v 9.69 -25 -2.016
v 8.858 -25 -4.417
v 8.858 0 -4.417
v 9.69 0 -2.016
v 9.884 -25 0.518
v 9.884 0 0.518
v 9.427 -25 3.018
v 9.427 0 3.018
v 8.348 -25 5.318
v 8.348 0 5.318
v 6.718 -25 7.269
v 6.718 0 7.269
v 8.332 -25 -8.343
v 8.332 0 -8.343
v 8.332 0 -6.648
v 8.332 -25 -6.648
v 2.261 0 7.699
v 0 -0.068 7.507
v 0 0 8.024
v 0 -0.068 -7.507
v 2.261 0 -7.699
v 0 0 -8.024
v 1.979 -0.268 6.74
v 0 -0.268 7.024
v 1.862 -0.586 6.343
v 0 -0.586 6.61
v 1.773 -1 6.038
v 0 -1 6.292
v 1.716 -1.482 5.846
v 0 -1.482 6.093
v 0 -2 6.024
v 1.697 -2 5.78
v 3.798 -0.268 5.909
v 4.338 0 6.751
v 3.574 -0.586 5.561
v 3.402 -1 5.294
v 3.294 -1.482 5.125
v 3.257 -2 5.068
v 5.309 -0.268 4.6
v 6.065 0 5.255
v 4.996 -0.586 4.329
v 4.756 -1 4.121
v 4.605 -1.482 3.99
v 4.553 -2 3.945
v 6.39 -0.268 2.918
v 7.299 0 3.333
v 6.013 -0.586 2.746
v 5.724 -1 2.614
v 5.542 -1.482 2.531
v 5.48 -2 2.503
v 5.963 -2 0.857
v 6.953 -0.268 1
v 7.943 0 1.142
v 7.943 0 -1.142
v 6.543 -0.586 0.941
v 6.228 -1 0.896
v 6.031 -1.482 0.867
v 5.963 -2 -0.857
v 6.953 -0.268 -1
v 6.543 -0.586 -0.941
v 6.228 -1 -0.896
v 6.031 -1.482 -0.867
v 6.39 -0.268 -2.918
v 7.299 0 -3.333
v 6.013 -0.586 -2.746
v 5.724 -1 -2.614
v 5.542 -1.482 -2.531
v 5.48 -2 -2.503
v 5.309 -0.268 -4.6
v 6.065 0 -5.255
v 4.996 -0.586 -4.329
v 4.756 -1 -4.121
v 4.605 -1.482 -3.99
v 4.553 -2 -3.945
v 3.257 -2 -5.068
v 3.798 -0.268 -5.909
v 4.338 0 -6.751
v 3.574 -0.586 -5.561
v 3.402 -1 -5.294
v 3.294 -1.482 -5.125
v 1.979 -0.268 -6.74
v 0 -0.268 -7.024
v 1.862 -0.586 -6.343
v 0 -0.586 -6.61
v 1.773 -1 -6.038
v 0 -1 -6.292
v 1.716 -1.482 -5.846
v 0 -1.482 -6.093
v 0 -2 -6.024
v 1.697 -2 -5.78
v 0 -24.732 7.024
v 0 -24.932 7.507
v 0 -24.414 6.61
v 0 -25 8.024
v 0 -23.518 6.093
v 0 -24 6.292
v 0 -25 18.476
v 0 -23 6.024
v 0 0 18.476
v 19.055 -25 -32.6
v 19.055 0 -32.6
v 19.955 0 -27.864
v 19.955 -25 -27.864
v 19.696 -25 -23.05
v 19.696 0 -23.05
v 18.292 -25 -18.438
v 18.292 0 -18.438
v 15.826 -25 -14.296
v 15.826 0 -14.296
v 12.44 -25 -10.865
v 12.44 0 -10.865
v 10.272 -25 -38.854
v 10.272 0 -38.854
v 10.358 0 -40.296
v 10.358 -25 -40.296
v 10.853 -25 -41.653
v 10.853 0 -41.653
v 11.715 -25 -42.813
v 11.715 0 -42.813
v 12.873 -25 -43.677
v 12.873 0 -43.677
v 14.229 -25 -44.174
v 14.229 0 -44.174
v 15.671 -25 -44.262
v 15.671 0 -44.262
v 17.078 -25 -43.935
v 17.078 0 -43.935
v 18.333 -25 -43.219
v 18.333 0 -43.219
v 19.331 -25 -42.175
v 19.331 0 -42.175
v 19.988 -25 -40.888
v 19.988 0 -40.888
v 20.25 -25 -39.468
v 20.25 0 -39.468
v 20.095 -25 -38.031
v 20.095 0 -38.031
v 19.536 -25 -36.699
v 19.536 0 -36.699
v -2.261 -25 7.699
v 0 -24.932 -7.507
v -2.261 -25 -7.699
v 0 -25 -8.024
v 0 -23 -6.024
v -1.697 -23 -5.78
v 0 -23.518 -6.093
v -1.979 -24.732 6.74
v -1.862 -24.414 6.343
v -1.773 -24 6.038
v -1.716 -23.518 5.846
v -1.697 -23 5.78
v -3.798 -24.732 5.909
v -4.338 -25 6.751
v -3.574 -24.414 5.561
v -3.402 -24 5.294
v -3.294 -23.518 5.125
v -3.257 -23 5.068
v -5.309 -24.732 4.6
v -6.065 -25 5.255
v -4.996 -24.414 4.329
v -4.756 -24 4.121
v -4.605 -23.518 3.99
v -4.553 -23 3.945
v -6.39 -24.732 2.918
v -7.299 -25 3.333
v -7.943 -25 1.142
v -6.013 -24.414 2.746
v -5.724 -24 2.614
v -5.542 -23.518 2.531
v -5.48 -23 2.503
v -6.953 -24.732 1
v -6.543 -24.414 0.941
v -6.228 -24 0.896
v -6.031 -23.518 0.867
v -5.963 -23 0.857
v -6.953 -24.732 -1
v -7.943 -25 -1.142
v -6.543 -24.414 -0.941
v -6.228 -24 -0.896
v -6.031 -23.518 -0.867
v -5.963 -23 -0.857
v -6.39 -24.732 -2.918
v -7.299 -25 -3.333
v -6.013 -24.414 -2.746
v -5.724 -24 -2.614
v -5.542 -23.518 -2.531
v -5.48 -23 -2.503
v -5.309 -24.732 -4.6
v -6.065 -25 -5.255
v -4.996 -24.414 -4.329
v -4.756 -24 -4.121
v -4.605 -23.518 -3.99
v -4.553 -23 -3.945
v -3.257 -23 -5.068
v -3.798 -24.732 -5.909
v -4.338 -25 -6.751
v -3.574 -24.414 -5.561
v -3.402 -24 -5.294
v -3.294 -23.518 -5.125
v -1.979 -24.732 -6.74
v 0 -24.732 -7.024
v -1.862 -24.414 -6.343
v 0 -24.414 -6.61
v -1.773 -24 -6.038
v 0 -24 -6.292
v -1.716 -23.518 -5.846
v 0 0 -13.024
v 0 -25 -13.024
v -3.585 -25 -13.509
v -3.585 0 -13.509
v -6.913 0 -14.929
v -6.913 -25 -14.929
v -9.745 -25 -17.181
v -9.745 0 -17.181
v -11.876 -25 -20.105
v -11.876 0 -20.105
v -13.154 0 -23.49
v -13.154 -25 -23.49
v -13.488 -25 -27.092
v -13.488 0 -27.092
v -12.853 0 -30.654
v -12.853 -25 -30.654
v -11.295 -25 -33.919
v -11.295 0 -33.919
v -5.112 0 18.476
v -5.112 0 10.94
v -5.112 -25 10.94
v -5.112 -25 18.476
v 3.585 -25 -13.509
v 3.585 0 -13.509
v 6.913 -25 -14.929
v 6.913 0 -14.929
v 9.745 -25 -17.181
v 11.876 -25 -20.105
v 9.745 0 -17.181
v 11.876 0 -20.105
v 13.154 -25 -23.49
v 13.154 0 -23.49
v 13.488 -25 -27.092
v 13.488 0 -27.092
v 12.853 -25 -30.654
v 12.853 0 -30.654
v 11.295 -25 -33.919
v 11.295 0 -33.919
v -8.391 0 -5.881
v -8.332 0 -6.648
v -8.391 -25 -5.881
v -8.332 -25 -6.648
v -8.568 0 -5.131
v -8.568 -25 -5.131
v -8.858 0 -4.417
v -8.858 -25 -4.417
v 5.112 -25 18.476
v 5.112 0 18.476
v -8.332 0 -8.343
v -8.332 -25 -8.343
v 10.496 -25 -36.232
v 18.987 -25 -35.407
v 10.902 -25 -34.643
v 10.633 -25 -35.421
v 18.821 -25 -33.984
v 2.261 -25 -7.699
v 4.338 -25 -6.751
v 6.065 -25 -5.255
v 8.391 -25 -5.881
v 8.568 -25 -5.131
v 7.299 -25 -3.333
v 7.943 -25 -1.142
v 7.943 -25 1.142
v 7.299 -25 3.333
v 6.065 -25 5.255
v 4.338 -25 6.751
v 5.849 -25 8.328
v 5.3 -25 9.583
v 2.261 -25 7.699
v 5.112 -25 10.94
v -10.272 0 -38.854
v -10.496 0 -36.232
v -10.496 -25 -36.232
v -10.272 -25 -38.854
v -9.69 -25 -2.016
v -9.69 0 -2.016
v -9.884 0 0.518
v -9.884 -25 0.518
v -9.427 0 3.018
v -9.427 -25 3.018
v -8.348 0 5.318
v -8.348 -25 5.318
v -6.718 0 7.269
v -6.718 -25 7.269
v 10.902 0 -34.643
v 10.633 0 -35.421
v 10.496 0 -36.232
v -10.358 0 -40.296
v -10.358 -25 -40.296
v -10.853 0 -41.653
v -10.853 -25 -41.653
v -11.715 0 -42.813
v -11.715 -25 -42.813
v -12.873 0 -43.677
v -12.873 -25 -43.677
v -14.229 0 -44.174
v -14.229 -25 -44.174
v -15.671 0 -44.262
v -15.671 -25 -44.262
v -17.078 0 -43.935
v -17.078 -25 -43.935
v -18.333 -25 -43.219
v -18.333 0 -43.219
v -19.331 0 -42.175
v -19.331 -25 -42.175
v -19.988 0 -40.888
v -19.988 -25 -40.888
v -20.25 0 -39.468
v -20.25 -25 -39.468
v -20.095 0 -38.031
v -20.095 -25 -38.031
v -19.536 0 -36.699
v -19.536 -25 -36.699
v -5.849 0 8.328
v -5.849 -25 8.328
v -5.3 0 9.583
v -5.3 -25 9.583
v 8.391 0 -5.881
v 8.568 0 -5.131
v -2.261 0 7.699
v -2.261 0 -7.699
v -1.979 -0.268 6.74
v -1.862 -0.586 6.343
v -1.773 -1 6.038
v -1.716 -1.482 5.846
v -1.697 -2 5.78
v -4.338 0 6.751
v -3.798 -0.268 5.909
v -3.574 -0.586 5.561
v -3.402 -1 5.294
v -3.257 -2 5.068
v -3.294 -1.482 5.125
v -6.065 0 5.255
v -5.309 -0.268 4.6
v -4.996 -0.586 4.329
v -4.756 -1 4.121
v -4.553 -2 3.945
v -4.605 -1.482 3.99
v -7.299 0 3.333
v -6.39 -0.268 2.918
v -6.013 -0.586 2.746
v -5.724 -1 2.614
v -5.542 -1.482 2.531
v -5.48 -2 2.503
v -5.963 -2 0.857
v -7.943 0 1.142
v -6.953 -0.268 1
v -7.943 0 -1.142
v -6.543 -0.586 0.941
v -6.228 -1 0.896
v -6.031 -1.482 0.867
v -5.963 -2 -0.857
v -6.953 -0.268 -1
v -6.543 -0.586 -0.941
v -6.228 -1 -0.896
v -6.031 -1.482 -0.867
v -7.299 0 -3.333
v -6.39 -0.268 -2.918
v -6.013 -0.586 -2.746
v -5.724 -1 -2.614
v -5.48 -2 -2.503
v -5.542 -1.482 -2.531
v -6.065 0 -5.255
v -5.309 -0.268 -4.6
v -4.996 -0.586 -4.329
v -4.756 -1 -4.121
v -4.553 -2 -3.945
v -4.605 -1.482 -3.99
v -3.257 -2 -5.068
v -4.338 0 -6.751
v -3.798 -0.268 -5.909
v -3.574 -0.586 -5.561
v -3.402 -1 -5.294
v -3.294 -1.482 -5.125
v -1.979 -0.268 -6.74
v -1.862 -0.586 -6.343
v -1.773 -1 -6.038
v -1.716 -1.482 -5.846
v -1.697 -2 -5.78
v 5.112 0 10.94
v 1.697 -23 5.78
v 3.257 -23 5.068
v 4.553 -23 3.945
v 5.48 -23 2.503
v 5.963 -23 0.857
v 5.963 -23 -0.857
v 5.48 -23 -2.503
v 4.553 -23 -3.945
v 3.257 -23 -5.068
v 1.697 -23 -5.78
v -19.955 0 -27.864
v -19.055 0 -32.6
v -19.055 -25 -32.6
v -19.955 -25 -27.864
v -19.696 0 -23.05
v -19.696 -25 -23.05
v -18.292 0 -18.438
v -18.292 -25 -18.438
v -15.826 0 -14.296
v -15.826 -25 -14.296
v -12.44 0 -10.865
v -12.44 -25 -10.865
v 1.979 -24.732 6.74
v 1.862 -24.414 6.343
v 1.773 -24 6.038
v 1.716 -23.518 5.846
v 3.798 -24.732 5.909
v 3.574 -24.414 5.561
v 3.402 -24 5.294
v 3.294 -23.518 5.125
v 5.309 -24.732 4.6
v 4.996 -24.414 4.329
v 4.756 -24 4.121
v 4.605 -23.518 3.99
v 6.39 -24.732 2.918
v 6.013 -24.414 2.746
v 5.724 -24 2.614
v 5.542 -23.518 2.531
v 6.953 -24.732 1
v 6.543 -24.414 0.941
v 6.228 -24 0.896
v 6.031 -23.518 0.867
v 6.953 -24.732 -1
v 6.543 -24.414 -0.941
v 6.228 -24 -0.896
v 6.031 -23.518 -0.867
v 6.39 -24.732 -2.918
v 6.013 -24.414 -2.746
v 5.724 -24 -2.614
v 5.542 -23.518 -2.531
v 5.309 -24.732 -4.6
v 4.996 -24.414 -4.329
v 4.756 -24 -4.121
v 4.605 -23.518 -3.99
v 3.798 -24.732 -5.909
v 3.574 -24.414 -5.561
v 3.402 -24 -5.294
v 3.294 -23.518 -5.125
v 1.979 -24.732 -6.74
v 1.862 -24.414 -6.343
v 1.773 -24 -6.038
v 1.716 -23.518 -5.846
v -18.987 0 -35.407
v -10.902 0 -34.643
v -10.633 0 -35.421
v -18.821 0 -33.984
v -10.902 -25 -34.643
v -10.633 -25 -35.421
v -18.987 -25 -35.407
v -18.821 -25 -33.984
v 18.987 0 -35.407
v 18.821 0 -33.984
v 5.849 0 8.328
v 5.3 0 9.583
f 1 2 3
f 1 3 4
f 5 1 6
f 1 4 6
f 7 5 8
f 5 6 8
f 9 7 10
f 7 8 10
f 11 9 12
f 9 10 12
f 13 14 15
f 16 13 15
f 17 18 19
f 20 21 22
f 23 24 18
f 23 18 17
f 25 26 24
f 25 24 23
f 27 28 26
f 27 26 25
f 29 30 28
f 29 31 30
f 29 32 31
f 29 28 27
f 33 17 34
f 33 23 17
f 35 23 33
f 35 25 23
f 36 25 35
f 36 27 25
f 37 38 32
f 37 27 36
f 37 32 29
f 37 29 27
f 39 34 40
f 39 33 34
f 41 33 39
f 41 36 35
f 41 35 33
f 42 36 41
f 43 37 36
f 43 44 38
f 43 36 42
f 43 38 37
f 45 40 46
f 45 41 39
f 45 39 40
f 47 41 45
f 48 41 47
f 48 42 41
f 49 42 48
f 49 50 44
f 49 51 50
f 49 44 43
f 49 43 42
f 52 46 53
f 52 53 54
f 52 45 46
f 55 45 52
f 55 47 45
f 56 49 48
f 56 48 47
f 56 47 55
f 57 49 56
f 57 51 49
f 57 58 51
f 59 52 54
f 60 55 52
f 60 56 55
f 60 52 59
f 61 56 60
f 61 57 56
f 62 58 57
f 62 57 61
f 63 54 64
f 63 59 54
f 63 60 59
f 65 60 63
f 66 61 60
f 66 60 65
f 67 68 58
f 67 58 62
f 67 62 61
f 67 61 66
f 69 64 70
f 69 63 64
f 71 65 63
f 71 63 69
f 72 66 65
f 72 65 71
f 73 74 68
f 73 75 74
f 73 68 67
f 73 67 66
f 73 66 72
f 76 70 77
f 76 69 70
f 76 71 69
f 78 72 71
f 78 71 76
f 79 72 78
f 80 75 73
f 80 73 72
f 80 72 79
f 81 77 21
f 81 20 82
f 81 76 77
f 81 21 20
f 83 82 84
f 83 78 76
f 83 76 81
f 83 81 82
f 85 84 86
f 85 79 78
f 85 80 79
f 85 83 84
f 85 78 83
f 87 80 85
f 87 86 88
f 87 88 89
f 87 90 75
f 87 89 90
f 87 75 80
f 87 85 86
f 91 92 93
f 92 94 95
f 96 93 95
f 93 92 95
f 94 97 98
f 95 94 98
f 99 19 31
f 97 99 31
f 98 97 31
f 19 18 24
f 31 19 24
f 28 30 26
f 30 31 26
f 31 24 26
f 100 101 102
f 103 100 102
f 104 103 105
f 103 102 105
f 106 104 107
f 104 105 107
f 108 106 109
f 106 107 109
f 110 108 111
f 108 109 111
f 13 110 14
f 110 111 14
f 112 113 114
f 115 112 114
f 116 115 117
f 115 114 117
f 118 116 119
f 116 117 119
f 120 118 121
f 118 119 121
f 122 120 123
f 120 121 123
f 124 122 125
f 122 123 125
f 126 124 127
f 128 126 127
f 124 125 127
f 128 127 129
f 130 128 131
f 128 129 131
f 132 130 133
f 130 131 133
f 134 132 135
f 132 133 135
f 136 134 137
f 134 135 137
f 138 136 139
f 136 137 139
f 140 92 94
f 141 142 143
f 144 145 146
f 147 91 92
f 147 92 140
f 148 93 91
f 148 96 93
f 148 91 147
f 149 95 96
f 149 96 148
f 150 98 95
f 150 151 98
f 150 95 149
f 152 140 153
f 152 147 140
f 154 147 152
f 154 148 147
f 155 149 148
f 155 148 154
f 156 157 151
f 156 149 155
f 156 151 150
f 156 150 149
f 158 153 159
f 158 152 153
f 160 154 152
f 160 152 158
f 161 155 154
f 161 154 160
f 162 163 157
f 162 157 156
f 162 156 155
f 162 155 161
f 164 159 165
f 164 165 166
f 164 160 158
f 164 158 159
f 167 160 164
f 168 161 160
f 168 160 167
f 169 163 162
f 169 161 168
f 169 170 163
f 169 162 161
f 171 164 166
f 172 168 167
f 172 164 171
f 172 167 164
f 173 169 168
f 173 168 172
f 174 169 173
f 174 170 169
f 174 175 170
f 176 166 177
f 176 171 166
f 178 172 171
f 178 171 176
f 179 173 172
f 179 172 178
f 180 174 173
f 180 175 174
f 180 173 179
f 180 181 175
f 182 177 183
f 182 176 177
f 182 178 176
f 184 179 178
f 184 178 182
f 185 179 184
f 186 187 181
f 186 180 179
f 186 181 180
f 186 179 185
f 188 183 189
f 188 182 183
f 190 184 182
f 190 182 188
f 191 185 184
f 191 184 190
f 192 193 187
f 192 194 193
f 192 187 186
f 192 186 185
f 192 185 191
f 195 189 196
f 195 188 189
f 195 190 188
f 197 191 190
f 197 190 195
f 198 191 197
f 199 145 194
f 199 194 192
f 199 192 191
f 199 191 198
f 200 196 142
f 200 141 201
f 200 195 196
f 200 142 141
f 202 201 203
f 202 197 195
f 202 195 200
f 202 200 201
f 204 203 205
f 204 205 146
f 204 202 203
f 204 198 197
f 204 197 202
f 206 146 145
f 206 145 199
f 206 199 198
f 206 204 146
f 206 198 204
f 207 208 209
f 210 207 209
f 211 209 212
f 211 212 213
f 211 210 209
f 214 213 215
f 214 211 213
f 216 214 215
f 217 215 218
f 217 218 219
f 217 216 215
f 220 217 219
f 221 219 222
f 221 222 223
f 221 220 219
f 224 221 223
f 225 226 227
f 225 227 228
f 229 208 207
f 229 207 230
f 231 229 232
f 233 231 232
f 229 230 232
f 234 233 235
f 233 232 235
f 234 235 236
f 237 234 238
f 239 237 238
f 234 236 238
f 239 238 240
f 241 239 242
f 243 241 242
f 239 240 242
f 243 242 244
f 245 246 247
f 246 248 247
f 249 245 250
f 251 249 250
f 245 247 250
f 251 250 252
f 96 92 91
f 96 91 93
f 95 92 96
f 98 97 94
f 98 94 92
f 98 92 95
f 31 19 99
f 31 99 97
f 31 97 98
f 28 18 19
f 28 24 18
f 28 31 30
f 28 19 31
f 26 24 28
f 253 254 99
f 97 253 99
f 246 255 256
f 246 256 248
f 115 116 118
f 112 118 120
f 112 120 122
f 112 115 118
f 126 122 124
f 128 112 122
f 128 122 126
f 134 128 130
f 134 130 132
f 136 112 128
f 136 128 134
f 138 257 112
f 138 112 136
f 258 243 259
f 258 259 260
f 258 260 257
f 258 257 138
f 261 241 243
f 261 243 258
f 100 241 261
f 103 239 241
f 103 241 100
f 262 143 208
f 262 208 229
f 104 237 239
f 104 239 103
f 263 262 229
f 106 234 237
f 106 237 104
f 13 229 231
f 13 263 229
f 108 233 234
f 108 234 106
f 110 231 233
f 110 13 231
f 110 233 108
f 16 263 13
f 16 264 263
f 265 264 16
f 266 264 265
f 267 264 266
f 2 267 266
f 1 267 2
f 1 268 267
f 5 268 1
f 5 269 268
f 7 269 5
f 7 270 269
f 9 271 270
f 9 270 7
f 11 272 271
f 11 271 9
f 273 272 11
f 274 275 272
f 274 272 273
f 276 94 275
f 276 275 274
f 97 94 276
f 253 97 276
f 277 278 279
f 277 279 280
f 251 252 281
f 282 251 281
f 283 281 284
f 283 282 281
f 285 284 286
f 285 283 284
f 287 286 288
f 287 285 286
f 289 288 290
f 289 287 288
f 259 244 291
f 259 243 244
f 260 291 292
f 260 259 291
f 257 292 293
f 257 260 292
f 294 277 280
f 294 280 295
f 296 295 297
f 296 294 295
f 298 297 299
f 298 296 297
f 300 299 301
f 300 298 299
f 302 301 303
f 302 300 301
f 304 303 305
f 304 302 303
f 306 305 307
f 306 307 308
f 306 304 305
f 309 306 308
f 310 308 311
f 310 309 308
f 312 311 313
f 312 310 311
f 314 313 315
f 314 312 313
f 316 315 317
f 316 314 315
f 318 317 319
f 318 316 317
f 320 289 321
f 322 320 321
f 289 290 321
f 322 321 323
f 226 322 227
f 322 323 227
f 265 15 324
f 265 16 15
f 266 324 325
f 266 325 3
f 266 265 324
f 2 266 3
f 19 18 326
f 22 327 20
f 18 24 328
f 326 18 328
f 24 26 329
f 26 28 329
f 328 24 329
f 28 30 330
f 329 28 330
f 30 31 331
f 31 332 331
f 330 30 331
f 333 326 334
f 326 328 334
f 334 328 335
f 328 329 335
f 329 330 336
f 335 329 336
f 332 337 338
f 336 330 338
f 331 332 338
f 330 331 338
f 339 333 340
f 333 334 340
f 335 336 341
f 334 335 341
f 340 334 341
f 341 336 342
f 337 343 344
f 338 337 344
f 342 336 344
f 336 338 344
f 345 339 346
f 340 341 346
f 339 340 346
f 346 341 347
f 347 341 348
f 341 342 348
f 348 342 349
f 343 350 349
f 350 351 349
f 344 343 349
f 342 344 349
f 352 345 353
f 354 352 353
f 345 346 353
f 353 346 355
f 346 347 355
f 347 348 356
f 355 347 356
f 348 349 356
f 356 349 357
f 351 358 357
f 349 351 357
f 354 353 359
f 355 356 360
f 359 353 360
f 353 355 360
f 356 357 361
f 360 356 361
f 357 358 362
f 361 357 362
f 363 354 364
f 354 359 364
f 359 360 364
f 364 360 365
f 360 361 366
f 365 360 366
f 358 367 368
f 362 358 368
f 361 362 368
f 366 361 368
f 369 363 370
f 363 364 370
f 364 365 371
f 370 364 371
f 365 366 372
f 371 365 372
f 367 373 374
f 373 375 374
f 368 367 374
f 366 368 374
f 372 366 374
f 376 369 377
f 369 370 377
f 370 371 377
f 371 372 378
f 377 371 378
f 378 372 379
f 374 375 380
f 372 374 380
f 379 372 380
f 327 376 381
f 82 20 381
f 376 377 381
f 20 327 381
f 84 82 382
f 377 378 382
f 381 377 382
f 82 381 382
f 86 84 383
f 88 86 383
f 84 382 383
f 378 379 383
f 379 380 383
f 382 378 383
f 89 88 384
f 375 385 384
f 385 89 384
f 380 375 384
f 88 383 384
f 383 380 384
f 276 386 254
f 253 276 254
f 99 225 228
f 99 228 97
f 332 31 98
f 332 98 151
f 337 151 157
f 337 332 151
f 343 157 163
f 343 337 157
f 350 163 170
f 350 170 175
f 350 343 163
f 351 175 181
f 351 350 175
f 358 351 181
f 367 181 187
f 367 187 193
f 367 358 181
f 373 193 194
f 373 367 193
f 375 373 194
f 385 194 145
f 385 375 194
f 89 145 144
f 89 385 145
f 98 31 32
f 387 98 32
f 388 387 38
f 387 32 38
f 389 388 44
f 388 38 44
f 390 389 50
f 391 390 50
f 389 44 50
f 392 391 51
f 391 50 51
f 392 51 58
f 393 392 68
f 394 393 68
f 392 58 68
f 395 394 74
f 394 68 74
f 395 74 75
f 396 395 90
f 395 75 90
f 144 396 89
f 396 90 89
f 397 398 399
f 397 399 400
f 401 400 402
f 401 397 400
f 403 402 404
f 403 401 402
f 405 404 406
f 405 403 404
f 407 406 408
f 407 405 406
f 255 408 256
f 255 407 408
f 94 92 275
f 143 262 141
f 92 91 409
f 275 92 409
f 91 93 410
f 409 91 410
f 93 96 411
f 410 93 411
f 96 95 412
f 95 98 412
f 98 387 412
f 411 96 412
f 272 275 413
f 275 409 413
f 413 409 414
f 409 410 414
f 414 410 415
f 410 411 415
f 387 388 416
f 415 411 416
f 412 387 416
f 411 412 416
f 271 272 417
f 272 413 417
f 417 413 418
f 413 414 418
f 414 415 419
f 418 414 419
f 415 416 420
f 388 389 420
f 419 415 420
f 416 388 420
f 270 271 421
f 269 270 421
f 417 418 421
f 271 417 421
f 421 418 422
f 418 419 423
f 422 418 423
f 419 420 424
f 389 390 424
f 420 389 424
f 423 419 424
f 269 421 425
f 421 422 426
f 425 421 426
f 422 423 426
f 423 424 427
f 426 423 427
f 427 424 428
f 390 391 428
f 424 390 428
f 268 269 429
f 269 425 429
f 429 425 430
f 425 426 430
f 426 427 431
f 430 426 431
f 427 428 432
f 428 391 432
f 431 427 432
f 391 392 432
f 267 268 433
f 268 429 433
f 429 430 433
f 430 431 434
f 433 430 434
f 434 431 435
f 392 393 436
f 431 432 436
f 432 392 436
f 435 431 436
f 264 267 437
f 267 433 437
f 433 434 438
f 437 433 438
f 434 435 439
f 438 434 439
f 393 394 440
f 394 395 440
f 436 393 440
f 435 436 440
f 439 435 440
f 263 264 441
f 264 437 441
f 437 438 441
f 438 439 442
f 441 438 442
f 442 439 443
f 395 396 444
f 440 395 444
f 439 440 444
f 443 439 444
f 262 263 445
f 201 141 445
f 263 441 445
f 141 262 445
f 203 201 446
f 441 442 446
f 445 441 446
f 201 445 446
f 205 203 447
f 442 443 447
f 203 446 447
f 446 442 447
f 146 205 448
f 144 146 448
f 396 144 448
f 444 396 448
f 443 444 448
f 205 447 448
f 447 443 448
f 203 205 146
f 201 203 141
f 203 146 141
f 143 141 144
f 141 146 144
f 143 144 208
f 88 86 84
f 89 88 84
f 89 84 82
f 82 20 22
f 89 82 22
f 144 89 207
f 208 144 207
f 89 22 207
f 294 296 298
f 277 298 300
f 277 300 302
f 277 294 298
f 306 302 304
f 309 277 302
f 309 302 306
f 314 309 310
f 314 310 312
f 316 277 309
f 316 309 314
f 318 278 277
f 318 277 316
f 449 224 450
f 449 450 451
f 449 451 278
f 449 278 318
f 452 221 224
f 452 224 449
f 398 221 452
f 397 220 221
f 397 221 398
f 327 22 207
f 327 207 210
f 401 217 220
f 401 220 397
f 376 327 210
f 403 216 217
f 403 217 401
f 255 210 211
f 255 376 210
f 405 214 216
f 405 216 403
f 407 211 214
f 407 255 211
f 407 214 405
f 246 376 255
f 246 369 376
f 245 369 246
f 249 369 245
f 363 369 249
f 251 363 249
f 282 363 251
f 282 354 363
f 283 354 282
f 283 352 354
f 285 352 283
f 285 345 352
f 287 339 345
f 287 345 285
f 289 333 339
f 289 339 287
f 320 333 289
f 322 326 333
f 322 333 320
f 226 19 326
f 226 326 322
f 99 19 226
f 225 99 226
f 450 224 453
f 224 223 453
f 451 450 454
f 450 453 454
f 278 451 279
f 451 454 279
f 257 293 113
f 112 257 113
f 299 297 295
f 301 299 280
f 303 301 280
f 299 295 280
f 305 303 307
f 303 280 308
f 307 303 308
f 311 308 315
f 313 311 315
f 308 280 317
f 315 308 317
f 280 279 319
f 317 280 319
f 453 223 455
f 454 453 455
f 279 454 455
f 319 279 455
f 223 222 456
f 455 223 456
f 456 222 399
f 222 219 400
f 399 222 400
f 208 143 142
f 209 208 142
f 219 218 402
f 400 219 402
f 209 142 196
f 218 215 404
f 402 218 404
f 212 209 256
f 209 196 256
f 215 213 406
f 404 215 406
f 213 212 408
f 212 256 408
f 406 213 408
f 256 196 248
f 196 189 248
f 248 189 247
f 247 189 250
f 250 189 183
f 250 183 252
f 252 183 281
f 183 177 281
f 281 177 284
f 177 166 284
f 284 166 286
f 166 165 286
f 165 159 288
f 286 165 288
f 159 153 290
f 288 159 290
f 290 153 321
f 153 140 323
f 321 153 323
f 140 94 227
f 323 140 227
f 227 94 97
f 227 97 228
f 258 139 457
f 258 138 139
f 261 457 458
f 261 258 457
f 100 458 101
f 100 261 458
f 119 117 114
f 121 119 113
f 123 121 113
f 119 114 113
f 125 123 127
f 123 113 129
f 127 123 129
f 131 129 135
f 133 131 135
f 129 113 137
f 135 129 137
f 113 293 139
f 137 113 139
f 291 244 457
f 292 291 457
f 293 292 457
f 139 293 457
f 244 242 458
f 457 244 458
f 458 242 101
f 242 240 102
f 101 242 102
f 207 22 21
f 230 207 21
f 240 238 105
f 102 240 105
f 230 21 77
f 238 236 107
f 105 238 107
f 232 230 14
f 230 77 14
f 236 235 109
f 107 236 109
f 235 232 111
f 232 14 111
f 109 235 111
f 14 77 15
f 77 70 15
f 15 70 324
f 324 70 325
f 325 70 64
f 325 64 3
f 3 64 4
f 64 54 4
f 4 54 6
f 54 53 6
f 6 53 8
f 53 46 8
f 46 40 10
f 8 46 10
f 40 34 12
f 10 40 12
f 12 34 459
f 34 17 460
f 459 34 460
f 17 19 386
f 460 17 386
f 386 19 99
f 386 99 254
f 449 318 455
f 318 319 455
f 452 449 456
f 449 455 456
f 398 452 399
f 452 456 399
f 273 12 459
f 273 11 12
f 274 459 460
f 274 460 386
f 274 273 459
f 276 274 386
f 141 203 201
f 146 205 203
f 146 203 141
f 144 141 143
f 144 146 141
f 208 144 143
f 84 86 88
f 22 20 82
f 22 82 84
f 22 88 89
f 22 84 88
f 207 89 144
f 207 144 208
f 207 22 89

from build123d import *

# Parameters (mm, degrees)
F1_DEPTH = 25
F3_R     = 5
F3_2_R   = 5
F4_R     = 2
F4_2_R   = 2


with BuildPart() as f1:
    # F0 (on Front) → F1 (new body)
    with BuildSketch(Plane.XZ):
        with BuildLine():
            ThreePointArc((0, -13.0244963626), (12.1428481509, -20.6252388852), (10.6124130002, -34.8687572833))
            Line((10.6124130002, -34.8687572833), (10.2718717194, -38.8542348753))
            ThreePointArc((10.2718717194, -38.8542348753), (17.410017551, -43.7910505016), (18.0512113015, -35.1357547229))
            ThreePointArc((18.0512113015, -35.1357547229), (18.8012077702, -19.7043360726), (8.3319982441, -8.3426976271))
            Line((8.3319982441, -8.3426976271), (8.3319982441, -5.3426976271))
            ThreePointArc((8.3319982441, -5.3426976271), (9.6395478341, 2.246270293), (5.111990881, 8.4755036374))
            Line((5.111990881, 8.4755036374), (5.111990881, 18.4755036374))
            Line((5.111990881, 18.4755036374), (0, 18.4755036374))
            Line((0, 18.4755036374), (0, 6.0244963626))
            ThreePointArc((0, 6.0244963626), (6.0244963626, 0), (0, -6.0244963626))
            Line((0, -6.0244963626), (0, -13.0244963626))
        make_face()
    extrude(amount=F1_DEPTH)


with BuildPart() as f2_1:
    # F2: instance of F1
    add(f1.part.mirror(Plane.YZ))

    # F3#2
    f3_2_edges = [f2_1.edges().sort_by_distance(p)[0] for p in [
        (-10.612413, -12.5, -34.868757),
        (-18.051211, -12.5, -35.135755),
        (-5.111991, -12.5, 8.475504),
        (-8.331998, -12.5, -5.342698),
    ]]
    fillet(f3_2_edges, radius=F3_2_R)

    # F4#2
    f4_2_edges = [f2_1.edges().sort_by_distance(p)[0] for p in [
        (-6.024496, -25, 0),
        (-6.024496, 0, 0),
    ]]
    fillet(f4_2_edges, radius=F4_2_R)


with BuildPart() as f1_1:
    add(f1.part)

    # F3
    f3_edges = [f1_1.edges().sort_by_distance(p)[0] for p in [
        (10.612413, -12.5, -34.868757),
        (18.051211, -12.5, -35.135755),
        (5.111991, -12.5, 8.475504),
        (8.331998, -12.5, -5.342698),
    ]]
    fillet(f3_edges, radius=F3_R)

    # F4
    f4_edges = [f1_1.edges().sort_by_distance(p)[0] for p in [
        (6.024496, -25, 0),
        (6.024496, 0, 0),
    ]]
    fillet(f4_edges, radius=F4_R)


solid = Compound([f2_1.part, f1_1.part])
